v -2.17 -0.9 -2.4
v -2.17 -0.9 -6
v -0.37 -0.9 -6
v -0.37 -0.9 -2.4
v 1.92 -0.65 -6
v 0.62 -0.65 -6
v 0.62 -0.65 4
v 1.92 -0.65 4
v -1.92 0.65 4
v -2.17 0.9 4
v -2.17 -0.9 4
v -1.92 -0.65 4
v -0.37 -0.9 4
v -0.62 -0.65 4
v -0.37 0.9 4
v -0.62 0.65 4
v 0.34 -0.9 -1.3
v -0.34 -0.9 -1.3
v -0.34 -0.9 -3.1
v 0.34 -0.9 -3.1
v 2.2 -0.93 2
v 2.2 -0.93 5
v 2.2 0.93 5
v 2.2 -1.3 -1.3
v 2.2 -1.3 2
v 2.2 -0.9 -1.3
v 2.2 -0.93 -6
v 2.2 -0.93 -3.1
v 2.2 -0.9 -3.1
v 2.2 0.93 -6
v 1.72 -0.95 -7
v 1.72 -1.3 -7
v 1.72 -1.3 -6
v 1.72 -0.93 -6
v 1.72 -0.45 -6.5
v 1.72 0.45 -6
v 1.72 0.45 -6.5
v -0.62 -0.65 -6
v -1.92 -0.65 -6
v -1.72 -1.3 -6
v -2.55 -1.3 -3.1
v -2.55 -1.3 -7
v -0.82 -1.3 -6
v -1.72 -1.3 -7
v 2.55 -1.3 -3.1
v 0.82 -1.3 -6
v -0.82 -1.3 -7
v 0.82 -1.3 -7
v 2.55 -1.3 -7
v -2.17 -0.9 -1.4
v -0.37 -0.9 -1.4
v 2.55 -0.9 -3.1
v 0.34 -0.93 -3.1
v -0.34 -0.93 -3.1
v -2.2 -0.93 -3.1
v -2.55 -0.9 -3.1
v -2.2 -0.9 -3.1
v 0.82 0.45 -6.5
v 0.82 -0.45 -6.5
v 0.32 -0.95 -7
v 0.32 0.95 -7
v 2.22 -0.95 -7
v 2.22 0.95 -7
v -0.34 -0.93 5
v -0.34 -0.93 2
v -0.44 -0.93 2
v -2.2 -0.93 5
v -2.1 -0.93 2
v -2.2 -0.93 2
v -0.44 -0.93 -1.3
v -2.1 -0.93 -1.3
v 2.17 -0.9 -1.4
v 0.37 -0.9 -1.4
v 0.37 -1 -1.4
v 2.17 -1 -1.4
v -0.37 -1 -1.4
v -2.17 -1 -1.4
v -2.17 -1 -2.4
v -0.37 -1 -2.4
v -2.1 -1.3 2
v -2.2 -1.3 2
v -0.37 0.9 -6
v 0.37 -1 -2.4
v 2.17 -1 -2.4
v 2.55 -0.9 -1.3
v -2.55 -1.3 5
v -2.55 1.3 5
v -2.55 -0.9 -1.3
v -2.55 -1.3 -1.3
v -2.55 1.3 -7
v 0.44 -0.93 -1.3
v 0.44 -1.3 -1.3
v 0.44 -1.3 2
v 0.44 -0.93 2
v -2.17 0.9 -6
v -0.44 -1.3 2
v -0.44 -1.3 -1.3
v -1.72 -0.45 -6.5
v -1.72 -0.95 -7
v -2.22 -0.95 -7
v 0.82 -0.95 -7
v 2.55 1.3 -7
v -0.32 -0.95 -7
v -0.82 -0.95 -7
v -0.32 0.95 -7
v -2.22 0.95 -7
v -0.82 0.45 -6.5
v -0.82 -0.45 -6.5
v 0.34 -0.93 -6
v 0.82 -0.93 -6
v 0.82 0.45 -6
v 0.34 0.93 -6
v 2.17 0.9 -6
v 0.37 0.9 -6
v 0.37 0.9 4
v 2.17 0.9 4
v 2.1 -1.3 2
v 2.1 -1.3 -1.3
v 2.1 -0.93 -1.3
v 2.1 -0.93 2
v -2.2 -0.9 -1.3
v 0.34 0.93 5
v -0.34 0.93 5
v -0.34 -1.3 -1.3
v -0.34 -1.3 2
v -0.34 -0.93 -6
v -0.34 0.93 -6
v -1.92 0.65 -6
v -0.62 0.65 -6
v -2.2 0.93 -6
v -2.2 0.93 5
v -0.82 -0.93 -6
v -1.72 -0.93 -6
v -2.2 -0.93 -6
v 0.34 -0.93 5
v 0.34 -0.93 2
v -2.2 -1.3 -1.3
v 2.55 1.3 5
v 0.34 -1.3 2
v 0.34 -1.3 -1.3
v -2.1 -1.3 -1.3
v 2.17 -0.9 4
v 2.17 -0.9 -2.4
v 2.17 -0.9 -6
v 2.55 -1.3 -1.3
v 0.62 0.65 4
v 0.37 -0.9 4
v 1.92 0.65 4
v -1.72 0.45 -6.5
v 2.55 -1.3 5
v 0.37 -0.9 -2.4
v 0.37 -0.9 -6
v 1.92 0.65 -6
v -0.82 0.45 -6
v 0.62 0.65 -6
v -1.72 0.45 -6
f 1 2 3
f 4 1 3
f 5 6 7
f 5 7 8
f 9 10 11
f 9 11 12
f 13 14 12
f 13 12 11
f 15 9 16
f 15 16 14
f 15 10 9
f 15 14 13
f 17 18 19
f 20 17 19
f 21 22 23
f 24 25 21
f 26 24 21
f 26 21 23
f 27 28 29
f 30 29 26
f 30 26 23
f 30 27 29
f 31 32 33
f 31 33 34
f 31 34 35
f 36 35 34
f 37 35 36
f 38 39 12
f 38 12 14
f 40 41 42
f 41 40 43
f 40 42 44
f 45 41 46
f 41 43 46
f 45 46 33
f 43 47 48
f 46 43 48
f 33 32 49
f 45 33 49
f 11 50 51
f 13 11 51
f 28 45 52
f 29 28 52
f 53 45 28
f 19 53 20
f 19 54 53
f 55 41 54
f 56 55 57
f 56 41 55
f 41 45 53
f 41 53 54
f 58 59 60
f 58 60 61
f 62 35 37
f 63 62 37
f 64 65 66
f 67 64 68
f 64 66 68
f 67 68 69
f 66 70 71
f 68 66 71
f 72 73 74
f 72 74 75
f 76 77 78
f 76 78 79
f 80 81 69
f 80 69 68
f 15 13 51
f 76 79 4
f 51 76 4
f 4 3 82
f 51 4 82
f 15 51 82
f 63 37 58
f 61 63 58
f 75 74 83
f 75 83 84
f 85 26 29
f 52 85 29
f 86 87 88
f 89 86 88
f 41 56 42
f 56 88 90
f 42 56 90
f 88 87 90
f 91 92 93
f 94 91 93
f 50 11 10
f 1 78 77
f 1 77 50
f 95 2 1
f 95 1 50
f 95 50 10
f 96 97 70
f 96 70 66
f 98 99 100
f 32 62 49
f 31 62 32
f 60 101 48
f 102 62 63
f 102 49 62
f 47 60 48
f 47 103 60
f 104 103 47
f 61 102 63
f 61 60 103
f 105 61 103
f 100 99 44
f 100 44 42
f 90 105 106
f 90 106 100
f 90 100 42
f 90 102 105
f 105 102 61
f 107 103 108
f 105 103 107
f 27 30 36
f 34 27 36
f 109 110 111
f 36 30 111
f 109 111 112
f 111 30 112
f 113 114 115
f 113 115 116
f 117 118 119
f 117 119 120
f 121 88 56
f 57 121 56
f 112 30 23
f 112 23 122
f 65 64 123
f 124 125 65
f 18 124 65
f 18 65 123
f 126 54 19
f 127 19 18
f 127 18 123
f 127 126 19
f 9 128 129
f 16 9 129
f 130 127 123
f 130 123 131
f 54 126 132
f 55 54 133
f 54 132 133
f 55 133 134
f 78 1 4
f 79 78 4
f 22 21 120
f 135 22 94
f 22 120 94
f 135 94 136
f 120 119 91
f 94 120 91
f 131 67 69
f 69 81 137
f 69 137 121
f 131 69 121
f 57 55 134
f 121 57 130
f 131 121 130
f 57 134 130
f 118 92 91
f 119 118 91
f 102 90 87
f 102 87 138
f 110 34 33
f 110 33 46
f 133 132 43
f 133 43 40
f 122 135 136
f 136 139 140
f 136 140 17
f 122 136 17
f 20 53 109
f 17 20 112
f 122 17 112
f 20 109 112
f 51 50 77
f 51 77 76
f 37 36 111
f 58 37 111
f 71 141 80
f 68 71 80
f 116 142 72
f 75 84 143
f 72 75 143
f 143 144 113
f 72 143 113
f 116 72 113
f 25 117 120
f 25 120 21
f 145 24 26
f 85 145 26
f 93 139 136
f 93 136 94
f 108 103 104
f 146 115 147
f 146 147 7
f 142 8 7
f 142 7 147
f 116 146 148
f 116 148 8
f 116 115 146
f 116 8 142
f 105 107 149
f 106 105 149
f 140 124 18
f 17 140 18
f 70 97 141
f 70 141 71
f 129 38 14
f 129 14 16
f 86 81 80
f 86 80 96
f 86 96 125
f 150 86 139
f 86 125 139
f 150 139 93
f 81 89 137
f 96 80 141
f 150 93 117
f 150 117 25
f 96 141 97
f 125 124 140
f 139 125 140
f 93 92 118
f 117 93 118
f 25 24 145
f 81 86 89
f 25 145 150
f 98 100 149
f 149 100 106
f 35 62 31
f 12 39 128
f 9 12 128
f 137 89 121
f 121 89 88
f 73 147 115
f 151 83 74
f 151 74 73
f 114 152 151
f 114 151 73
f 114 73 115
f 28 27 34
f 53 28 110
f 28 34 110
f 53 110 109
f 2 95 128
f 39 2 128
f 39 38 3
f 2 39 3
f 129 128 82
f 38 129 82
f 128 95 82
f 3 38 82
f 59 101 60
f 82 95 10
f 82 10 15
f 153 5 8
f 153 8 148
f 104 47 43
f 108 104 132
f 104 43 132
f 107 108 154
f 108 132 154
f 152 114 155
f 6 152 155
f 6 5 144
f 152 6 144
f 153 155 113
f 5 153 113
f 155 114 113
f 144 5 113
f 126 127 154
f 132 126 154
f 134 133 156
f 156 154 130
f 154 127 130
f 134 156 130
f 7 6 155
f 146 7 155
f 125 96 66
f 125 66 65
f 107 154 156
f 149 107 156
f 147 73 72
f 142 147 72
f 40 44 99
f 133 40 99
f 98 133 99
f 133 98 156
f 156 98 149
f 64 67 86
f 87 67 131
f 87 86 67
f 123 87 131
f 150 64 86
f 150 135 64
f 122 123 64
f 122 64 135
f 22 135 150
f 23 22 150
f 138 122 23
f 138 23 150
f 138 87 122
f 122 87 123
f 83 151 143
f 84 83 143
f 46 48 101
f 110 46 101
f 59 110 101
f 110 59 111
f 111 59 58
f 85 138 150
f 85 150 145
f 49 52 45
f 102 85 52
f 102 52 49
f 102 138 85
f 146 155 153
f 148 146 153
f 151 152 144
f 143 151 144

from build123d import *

# Parameters (mm, degrees)
SKETCH1_W               = 5.1
SKETCH1_H               = 14
BOSS_EXTRUDE1_DEPTH     = 1.3
SKETCH2_W               = 1.86
SKETCH2_H               = 1.86
CUT_EXTRUDE1_DEPTH      = 15.289594116
CUT_EXTRUDE2_DEPTH      = 8.562572314
CUT_EXTRUDE2_DEPTH_BACK = 8.562572314
SKETCH3_W               = 1.8
SKETCH3_H               = 0.4
CUT_EXTRUDE3_REACH      = 9.891
SKETCH8_W               = 0.1
SKETCH8_H               = 3.3
BOSS_EXTRUDE2_START     = -1
SKETCH5_W               = 1.86
SKETCH5_H               = 1.86
SKETCH5_W_2             = 0.9
SKETCH5_H_2             = 0.9
BOSS_EXTRUDE2_DEPTH     = 1
CHAMFER2_SIZE           = 0.5
SKETCH6_W               = 1.8
SKETCH6_H               = 1.8
SKETCH6_W_2             = 1.3
SKETCH6_H_2             = 1.3
BOSS_EXTRUDE3_DEPTH     = 10
BOSS_EXTRUDE3_2_DEPTH   = 10
SKETCH7_W               = 1.8
SKETCH7_H               = 1
BOSS_EXTRUDE4_DEPTH     = 0.1
SKETCH9_W               = 5.1
SKETCH9_H               = 2
CUT_EXTRUDE4_DEPTH      = 8.890659035
SKETCH10_W              = 0.9
SKETCH10_H              = 0.85
CUT_EXTRUDE5_DEPTH      = 1


with BuildPart() as part:
    # Sketch1 → Boss-Extrude1 (new, symmetric)
    with BuildSketch(Plane(origin=(0, 0, 0), x_dir=(1, 0, 0), z_dir=(0, 1, 0))):
        Rectangle(SKETCH1_W, SKETCH1_H)
    extrude(amount=BOSS_EXTRUDE1_DEPTH, both=True)

    # Sketch2 → Cut-Extrude1 (cut, through all)
    with BuildSketch(Plane(origin=(0, 0, -7), x_dir=(-1, 0, 0), z_dir=(0, 0, -1))):
        with Locations((-1.27, 0)):
            Rectangle(SKETCH2_W, SKETCH2_H)
        with Locations((1.27, 0)):
            Rectangle(SKETCH2_W, SKETCH2_H)
    extrude(amount=-CUT_EXTRUDE1_DEPTH, mode=Mode.SUBTRACT)

    # Sketch3 → Cut-Extrude2 (cut, two sides: drawn at the far end of the back side and taken through both)
    with BuildSketch(Plane(origin=(0, 0, 0), x_dir=(0, 0, -1), z_dir=(1, 0, 0)).offset(-CUT_EXTRUDE2_DEPTH_BACK)):
        with Locations((2.2, -1.1)):
            Rectangle(SKETCH3_W, SKETCH3_H)
    extrude(amount=CUT_EXTRUDE2_DEPTH + CUT_EXTRUDE2_DEPTH_BACK, mode=Mode.SUBTRACT)

    # Sketch8 → Cut-Extrude3 (cut, up to next)
    with BuildSketch(Plane.XZ.offset(1.3), mode=Mode.PRIVATE) as cut_extrude3_sk1:
        with Locations((-2.15, 0.35)):
            Rectangle(SKETCH8_W, SKETCH8_H)
    cut_extrude3_tool1 = extrude(cut_extrude3_sk1.sketch, amount=-CUT_EXTRUDE3_REACH, mode=Mode.PRIVATE) & part.part
    # Sketch8 → Cut-Extrude3 (cut, up to next)
    with BuildSketch(Plane.XZ.offset(1.3), mode=Mode.PRIVATE) as cut_extrude3_sk2:
        with Locations((-0.39, 0.35)):
            Rectangle(SKETCH8_W, SKETCH8_H)
    cut_extrude3_tool2 = extrude(cut_extrude3_sk2.sketch, amount=-CUT_EXTRUDE3_REACH, mode=Mode.PRIVATE) & part.part
    # Sketch8 → Cut-Extrude3 (cut, up to next)
    with BuildSketch(Plane.XZ.offset(1.3), mode=Mode.PRIVATE) as cut_extrude3_sk3:
        with Locations((0.39, 0.35)):
            Rectangle(SKETCH8_W, SKETCH8_H)
    cut_extrude3_tool3 = extrude(cut_extrude3_sk3.sketch, amount=-CUT_EXTRUDE3_REACH, mode=Mode.PRIVATE) & part.part
    # Sketch8 → Cut-Extrude3 (cut, up to next)
    with BuildSketch(Plane.XZ.offset(1.3), mode=Mode.PRIVATE) as cut_extrude3_sk4:
        with Locations((2.15, 0.35)):
            Rectangle(SKETCH8_W, SKETCH8_H)
    cut_extrude3_tool4 = extrude(cut_extrude3_sk4.sketch, amount=-CUT_EXTRUDE3_REACH, mode=Mode.PRIVATE) & part.part
    add(cut_extrude3_tool1.solids().sort_by_distance((-2.15, -1.3, 0.35))[0], mode=Mode.SUBTRACT)
    add(cut_extrude3_tool2.solids().sort_by_distance((-0.39, -1.3, 0.35))[0], mode=Mode.SUBTRACT)
    add(cut_extrude3_tool3.solids().sort_by_distance((0.39, -1.3, 0.35))[0], mode=Mode.SUBTRACT)
    add(cut_extrude3_tool4.solids().sort_by_distance((2.15, -1.3, 0.35))[0], mode=Mode.SUBTRACT)

    # Sketch5 → Boss-Extrude2 (add)
    # profile 1 of 2: a face of its own
    with BuildSketch(Plane(origin=(0, 0, -7), x_dir=(-1, 0, 0), z_dir=(0, 0, -1)).offset(BOSS_EXTRUDE2_START)):
        with Locations((1.27, 0)):
            Rectangle(SKETCH5_W, SKETCH5_H)
        with Locations((1.27, 0)):
            Rectangle(SKETCH5_W_2, SKETCH5_H_2, mode=Mode.SUBTRACT)
    # profile 2 of 2: a face of its own
    with BuildSketch(Plane(origin=(0, 0, -7), x_dir=(-1, 0, 0), z_dir=(0, 0, -1)).offset(BOSS_EXTRUDE2_START)):
        with Locations((-1.27, 0)):
            Rectangle(SKETCH5_W, SKETCH5_H)
        with Locations((-1.27, 0)):
            Rectangle(SKETCH5_W_2, SKETCH5_H_2, mode=Mode.SUBTRACT)
    extrude(amount=BOSS_EXTRUDE2_DEPTH)

    # Chamfer2
    chamfer2_edges = [part.edges().sort_by_distance(p)[0] for p in [
        (-0.82, 0, -7),
        (-1.27, 0.45, -7),
        (-1.72, 0, -7),
        (-1.27, -0.45, -7),
        (1.72, 0, -7),
        (1.27, 0.45, -7),
        (0.82, 0, -7),
        (1.27, -0.45, -7),
    ]]
    chamfer(chamfer2_edges, length=CHAMFER2_SIZE)

    # Sketch9 → Cut-Extrude4 (cut, through all)
    with BuildSketch(Plane(origin=(0, 1.3, 0), x_dir=(1, 0, 0), z_dir=(0, 1, 0))):
        with Locations((0, -6)):
            Rectangle(SKETCH9_W, SKETCH9_H)
    extrude(amount=-CUT_EXTRUDE4_DEPTH, mode=Mode.SUBTRACT)

    # Sketch10 → Cut-Extrude5 (cut)
    with BuildSketch(Plane(origin=(0, 0, -7), x_dir=(-1, 0, 0), z_dir=(0, 0, -1))):
        with Locations((-1.27, -0.875)):
            Rectangle(SKETCH10_W, SKETCH10_H)
        with Locations((1.27, -0.875)):
            Rectangle(SKETCH10_W, SKETCH10_H)
    extrude(amount=-CUT_EXTRUDE5_DEPTH, mode=Mode.SUBTRACT)


with BuildPart() as body_2:
    # Sketch6 → Boss-Extrude3 (new body)
    with BuildSketch(Plane.XY.offset(-6)):
        with Locations((-1.27, 0)):
            Rectangle(SKETCH6_W, SKETCH6_H)
        with Locations((-1.27, 0)):
            Rectangle(SKETCH6_W_2, SKETCH6_H_2, mode=Mode.SUBTRACT)
    extrude(amount=BOSS_EXTRUDE3_DEPTH)



with BuildPart() as body_3:
    # Sketch6 → Boss-Extrude3 2 (new body)
    with BuildSketch(Plane.XY.offset(-6)):
        with Locations((1.27, 0)):
            Rectangle(SKETCH6_W, SKETCH6_H)
        with Locations((1.27, 0)):
            Rectangle(SKETCH6_W_2, SKETCH6_H_2, mode=Mode.SUBTRACT)
    extrude(amount=BOSS_EXTRUDE3_2_DEPTH)


with BuildPart() as body_2_1:
    add(body_2.part)

    add(body_3.part)  # Boss-Extrude4 merges body 3
    # Sketch7 → Boss-Extrude4 (add)
    with BuildSketch(Plane.XZ.offset(0.9)):
        with Locations((-1.27, -1.9)):
            Rectangle(SKETCH7_W, SKETCH7_H)
        with Locations((1.27, -1.9)):
            Rectangle(SKETCH7_W, SKETCH7_H)
    extrude(amount=BOSS_EXTRUDE4_DEPTH)


solid = Compound([part.part, body_2_1.part])
